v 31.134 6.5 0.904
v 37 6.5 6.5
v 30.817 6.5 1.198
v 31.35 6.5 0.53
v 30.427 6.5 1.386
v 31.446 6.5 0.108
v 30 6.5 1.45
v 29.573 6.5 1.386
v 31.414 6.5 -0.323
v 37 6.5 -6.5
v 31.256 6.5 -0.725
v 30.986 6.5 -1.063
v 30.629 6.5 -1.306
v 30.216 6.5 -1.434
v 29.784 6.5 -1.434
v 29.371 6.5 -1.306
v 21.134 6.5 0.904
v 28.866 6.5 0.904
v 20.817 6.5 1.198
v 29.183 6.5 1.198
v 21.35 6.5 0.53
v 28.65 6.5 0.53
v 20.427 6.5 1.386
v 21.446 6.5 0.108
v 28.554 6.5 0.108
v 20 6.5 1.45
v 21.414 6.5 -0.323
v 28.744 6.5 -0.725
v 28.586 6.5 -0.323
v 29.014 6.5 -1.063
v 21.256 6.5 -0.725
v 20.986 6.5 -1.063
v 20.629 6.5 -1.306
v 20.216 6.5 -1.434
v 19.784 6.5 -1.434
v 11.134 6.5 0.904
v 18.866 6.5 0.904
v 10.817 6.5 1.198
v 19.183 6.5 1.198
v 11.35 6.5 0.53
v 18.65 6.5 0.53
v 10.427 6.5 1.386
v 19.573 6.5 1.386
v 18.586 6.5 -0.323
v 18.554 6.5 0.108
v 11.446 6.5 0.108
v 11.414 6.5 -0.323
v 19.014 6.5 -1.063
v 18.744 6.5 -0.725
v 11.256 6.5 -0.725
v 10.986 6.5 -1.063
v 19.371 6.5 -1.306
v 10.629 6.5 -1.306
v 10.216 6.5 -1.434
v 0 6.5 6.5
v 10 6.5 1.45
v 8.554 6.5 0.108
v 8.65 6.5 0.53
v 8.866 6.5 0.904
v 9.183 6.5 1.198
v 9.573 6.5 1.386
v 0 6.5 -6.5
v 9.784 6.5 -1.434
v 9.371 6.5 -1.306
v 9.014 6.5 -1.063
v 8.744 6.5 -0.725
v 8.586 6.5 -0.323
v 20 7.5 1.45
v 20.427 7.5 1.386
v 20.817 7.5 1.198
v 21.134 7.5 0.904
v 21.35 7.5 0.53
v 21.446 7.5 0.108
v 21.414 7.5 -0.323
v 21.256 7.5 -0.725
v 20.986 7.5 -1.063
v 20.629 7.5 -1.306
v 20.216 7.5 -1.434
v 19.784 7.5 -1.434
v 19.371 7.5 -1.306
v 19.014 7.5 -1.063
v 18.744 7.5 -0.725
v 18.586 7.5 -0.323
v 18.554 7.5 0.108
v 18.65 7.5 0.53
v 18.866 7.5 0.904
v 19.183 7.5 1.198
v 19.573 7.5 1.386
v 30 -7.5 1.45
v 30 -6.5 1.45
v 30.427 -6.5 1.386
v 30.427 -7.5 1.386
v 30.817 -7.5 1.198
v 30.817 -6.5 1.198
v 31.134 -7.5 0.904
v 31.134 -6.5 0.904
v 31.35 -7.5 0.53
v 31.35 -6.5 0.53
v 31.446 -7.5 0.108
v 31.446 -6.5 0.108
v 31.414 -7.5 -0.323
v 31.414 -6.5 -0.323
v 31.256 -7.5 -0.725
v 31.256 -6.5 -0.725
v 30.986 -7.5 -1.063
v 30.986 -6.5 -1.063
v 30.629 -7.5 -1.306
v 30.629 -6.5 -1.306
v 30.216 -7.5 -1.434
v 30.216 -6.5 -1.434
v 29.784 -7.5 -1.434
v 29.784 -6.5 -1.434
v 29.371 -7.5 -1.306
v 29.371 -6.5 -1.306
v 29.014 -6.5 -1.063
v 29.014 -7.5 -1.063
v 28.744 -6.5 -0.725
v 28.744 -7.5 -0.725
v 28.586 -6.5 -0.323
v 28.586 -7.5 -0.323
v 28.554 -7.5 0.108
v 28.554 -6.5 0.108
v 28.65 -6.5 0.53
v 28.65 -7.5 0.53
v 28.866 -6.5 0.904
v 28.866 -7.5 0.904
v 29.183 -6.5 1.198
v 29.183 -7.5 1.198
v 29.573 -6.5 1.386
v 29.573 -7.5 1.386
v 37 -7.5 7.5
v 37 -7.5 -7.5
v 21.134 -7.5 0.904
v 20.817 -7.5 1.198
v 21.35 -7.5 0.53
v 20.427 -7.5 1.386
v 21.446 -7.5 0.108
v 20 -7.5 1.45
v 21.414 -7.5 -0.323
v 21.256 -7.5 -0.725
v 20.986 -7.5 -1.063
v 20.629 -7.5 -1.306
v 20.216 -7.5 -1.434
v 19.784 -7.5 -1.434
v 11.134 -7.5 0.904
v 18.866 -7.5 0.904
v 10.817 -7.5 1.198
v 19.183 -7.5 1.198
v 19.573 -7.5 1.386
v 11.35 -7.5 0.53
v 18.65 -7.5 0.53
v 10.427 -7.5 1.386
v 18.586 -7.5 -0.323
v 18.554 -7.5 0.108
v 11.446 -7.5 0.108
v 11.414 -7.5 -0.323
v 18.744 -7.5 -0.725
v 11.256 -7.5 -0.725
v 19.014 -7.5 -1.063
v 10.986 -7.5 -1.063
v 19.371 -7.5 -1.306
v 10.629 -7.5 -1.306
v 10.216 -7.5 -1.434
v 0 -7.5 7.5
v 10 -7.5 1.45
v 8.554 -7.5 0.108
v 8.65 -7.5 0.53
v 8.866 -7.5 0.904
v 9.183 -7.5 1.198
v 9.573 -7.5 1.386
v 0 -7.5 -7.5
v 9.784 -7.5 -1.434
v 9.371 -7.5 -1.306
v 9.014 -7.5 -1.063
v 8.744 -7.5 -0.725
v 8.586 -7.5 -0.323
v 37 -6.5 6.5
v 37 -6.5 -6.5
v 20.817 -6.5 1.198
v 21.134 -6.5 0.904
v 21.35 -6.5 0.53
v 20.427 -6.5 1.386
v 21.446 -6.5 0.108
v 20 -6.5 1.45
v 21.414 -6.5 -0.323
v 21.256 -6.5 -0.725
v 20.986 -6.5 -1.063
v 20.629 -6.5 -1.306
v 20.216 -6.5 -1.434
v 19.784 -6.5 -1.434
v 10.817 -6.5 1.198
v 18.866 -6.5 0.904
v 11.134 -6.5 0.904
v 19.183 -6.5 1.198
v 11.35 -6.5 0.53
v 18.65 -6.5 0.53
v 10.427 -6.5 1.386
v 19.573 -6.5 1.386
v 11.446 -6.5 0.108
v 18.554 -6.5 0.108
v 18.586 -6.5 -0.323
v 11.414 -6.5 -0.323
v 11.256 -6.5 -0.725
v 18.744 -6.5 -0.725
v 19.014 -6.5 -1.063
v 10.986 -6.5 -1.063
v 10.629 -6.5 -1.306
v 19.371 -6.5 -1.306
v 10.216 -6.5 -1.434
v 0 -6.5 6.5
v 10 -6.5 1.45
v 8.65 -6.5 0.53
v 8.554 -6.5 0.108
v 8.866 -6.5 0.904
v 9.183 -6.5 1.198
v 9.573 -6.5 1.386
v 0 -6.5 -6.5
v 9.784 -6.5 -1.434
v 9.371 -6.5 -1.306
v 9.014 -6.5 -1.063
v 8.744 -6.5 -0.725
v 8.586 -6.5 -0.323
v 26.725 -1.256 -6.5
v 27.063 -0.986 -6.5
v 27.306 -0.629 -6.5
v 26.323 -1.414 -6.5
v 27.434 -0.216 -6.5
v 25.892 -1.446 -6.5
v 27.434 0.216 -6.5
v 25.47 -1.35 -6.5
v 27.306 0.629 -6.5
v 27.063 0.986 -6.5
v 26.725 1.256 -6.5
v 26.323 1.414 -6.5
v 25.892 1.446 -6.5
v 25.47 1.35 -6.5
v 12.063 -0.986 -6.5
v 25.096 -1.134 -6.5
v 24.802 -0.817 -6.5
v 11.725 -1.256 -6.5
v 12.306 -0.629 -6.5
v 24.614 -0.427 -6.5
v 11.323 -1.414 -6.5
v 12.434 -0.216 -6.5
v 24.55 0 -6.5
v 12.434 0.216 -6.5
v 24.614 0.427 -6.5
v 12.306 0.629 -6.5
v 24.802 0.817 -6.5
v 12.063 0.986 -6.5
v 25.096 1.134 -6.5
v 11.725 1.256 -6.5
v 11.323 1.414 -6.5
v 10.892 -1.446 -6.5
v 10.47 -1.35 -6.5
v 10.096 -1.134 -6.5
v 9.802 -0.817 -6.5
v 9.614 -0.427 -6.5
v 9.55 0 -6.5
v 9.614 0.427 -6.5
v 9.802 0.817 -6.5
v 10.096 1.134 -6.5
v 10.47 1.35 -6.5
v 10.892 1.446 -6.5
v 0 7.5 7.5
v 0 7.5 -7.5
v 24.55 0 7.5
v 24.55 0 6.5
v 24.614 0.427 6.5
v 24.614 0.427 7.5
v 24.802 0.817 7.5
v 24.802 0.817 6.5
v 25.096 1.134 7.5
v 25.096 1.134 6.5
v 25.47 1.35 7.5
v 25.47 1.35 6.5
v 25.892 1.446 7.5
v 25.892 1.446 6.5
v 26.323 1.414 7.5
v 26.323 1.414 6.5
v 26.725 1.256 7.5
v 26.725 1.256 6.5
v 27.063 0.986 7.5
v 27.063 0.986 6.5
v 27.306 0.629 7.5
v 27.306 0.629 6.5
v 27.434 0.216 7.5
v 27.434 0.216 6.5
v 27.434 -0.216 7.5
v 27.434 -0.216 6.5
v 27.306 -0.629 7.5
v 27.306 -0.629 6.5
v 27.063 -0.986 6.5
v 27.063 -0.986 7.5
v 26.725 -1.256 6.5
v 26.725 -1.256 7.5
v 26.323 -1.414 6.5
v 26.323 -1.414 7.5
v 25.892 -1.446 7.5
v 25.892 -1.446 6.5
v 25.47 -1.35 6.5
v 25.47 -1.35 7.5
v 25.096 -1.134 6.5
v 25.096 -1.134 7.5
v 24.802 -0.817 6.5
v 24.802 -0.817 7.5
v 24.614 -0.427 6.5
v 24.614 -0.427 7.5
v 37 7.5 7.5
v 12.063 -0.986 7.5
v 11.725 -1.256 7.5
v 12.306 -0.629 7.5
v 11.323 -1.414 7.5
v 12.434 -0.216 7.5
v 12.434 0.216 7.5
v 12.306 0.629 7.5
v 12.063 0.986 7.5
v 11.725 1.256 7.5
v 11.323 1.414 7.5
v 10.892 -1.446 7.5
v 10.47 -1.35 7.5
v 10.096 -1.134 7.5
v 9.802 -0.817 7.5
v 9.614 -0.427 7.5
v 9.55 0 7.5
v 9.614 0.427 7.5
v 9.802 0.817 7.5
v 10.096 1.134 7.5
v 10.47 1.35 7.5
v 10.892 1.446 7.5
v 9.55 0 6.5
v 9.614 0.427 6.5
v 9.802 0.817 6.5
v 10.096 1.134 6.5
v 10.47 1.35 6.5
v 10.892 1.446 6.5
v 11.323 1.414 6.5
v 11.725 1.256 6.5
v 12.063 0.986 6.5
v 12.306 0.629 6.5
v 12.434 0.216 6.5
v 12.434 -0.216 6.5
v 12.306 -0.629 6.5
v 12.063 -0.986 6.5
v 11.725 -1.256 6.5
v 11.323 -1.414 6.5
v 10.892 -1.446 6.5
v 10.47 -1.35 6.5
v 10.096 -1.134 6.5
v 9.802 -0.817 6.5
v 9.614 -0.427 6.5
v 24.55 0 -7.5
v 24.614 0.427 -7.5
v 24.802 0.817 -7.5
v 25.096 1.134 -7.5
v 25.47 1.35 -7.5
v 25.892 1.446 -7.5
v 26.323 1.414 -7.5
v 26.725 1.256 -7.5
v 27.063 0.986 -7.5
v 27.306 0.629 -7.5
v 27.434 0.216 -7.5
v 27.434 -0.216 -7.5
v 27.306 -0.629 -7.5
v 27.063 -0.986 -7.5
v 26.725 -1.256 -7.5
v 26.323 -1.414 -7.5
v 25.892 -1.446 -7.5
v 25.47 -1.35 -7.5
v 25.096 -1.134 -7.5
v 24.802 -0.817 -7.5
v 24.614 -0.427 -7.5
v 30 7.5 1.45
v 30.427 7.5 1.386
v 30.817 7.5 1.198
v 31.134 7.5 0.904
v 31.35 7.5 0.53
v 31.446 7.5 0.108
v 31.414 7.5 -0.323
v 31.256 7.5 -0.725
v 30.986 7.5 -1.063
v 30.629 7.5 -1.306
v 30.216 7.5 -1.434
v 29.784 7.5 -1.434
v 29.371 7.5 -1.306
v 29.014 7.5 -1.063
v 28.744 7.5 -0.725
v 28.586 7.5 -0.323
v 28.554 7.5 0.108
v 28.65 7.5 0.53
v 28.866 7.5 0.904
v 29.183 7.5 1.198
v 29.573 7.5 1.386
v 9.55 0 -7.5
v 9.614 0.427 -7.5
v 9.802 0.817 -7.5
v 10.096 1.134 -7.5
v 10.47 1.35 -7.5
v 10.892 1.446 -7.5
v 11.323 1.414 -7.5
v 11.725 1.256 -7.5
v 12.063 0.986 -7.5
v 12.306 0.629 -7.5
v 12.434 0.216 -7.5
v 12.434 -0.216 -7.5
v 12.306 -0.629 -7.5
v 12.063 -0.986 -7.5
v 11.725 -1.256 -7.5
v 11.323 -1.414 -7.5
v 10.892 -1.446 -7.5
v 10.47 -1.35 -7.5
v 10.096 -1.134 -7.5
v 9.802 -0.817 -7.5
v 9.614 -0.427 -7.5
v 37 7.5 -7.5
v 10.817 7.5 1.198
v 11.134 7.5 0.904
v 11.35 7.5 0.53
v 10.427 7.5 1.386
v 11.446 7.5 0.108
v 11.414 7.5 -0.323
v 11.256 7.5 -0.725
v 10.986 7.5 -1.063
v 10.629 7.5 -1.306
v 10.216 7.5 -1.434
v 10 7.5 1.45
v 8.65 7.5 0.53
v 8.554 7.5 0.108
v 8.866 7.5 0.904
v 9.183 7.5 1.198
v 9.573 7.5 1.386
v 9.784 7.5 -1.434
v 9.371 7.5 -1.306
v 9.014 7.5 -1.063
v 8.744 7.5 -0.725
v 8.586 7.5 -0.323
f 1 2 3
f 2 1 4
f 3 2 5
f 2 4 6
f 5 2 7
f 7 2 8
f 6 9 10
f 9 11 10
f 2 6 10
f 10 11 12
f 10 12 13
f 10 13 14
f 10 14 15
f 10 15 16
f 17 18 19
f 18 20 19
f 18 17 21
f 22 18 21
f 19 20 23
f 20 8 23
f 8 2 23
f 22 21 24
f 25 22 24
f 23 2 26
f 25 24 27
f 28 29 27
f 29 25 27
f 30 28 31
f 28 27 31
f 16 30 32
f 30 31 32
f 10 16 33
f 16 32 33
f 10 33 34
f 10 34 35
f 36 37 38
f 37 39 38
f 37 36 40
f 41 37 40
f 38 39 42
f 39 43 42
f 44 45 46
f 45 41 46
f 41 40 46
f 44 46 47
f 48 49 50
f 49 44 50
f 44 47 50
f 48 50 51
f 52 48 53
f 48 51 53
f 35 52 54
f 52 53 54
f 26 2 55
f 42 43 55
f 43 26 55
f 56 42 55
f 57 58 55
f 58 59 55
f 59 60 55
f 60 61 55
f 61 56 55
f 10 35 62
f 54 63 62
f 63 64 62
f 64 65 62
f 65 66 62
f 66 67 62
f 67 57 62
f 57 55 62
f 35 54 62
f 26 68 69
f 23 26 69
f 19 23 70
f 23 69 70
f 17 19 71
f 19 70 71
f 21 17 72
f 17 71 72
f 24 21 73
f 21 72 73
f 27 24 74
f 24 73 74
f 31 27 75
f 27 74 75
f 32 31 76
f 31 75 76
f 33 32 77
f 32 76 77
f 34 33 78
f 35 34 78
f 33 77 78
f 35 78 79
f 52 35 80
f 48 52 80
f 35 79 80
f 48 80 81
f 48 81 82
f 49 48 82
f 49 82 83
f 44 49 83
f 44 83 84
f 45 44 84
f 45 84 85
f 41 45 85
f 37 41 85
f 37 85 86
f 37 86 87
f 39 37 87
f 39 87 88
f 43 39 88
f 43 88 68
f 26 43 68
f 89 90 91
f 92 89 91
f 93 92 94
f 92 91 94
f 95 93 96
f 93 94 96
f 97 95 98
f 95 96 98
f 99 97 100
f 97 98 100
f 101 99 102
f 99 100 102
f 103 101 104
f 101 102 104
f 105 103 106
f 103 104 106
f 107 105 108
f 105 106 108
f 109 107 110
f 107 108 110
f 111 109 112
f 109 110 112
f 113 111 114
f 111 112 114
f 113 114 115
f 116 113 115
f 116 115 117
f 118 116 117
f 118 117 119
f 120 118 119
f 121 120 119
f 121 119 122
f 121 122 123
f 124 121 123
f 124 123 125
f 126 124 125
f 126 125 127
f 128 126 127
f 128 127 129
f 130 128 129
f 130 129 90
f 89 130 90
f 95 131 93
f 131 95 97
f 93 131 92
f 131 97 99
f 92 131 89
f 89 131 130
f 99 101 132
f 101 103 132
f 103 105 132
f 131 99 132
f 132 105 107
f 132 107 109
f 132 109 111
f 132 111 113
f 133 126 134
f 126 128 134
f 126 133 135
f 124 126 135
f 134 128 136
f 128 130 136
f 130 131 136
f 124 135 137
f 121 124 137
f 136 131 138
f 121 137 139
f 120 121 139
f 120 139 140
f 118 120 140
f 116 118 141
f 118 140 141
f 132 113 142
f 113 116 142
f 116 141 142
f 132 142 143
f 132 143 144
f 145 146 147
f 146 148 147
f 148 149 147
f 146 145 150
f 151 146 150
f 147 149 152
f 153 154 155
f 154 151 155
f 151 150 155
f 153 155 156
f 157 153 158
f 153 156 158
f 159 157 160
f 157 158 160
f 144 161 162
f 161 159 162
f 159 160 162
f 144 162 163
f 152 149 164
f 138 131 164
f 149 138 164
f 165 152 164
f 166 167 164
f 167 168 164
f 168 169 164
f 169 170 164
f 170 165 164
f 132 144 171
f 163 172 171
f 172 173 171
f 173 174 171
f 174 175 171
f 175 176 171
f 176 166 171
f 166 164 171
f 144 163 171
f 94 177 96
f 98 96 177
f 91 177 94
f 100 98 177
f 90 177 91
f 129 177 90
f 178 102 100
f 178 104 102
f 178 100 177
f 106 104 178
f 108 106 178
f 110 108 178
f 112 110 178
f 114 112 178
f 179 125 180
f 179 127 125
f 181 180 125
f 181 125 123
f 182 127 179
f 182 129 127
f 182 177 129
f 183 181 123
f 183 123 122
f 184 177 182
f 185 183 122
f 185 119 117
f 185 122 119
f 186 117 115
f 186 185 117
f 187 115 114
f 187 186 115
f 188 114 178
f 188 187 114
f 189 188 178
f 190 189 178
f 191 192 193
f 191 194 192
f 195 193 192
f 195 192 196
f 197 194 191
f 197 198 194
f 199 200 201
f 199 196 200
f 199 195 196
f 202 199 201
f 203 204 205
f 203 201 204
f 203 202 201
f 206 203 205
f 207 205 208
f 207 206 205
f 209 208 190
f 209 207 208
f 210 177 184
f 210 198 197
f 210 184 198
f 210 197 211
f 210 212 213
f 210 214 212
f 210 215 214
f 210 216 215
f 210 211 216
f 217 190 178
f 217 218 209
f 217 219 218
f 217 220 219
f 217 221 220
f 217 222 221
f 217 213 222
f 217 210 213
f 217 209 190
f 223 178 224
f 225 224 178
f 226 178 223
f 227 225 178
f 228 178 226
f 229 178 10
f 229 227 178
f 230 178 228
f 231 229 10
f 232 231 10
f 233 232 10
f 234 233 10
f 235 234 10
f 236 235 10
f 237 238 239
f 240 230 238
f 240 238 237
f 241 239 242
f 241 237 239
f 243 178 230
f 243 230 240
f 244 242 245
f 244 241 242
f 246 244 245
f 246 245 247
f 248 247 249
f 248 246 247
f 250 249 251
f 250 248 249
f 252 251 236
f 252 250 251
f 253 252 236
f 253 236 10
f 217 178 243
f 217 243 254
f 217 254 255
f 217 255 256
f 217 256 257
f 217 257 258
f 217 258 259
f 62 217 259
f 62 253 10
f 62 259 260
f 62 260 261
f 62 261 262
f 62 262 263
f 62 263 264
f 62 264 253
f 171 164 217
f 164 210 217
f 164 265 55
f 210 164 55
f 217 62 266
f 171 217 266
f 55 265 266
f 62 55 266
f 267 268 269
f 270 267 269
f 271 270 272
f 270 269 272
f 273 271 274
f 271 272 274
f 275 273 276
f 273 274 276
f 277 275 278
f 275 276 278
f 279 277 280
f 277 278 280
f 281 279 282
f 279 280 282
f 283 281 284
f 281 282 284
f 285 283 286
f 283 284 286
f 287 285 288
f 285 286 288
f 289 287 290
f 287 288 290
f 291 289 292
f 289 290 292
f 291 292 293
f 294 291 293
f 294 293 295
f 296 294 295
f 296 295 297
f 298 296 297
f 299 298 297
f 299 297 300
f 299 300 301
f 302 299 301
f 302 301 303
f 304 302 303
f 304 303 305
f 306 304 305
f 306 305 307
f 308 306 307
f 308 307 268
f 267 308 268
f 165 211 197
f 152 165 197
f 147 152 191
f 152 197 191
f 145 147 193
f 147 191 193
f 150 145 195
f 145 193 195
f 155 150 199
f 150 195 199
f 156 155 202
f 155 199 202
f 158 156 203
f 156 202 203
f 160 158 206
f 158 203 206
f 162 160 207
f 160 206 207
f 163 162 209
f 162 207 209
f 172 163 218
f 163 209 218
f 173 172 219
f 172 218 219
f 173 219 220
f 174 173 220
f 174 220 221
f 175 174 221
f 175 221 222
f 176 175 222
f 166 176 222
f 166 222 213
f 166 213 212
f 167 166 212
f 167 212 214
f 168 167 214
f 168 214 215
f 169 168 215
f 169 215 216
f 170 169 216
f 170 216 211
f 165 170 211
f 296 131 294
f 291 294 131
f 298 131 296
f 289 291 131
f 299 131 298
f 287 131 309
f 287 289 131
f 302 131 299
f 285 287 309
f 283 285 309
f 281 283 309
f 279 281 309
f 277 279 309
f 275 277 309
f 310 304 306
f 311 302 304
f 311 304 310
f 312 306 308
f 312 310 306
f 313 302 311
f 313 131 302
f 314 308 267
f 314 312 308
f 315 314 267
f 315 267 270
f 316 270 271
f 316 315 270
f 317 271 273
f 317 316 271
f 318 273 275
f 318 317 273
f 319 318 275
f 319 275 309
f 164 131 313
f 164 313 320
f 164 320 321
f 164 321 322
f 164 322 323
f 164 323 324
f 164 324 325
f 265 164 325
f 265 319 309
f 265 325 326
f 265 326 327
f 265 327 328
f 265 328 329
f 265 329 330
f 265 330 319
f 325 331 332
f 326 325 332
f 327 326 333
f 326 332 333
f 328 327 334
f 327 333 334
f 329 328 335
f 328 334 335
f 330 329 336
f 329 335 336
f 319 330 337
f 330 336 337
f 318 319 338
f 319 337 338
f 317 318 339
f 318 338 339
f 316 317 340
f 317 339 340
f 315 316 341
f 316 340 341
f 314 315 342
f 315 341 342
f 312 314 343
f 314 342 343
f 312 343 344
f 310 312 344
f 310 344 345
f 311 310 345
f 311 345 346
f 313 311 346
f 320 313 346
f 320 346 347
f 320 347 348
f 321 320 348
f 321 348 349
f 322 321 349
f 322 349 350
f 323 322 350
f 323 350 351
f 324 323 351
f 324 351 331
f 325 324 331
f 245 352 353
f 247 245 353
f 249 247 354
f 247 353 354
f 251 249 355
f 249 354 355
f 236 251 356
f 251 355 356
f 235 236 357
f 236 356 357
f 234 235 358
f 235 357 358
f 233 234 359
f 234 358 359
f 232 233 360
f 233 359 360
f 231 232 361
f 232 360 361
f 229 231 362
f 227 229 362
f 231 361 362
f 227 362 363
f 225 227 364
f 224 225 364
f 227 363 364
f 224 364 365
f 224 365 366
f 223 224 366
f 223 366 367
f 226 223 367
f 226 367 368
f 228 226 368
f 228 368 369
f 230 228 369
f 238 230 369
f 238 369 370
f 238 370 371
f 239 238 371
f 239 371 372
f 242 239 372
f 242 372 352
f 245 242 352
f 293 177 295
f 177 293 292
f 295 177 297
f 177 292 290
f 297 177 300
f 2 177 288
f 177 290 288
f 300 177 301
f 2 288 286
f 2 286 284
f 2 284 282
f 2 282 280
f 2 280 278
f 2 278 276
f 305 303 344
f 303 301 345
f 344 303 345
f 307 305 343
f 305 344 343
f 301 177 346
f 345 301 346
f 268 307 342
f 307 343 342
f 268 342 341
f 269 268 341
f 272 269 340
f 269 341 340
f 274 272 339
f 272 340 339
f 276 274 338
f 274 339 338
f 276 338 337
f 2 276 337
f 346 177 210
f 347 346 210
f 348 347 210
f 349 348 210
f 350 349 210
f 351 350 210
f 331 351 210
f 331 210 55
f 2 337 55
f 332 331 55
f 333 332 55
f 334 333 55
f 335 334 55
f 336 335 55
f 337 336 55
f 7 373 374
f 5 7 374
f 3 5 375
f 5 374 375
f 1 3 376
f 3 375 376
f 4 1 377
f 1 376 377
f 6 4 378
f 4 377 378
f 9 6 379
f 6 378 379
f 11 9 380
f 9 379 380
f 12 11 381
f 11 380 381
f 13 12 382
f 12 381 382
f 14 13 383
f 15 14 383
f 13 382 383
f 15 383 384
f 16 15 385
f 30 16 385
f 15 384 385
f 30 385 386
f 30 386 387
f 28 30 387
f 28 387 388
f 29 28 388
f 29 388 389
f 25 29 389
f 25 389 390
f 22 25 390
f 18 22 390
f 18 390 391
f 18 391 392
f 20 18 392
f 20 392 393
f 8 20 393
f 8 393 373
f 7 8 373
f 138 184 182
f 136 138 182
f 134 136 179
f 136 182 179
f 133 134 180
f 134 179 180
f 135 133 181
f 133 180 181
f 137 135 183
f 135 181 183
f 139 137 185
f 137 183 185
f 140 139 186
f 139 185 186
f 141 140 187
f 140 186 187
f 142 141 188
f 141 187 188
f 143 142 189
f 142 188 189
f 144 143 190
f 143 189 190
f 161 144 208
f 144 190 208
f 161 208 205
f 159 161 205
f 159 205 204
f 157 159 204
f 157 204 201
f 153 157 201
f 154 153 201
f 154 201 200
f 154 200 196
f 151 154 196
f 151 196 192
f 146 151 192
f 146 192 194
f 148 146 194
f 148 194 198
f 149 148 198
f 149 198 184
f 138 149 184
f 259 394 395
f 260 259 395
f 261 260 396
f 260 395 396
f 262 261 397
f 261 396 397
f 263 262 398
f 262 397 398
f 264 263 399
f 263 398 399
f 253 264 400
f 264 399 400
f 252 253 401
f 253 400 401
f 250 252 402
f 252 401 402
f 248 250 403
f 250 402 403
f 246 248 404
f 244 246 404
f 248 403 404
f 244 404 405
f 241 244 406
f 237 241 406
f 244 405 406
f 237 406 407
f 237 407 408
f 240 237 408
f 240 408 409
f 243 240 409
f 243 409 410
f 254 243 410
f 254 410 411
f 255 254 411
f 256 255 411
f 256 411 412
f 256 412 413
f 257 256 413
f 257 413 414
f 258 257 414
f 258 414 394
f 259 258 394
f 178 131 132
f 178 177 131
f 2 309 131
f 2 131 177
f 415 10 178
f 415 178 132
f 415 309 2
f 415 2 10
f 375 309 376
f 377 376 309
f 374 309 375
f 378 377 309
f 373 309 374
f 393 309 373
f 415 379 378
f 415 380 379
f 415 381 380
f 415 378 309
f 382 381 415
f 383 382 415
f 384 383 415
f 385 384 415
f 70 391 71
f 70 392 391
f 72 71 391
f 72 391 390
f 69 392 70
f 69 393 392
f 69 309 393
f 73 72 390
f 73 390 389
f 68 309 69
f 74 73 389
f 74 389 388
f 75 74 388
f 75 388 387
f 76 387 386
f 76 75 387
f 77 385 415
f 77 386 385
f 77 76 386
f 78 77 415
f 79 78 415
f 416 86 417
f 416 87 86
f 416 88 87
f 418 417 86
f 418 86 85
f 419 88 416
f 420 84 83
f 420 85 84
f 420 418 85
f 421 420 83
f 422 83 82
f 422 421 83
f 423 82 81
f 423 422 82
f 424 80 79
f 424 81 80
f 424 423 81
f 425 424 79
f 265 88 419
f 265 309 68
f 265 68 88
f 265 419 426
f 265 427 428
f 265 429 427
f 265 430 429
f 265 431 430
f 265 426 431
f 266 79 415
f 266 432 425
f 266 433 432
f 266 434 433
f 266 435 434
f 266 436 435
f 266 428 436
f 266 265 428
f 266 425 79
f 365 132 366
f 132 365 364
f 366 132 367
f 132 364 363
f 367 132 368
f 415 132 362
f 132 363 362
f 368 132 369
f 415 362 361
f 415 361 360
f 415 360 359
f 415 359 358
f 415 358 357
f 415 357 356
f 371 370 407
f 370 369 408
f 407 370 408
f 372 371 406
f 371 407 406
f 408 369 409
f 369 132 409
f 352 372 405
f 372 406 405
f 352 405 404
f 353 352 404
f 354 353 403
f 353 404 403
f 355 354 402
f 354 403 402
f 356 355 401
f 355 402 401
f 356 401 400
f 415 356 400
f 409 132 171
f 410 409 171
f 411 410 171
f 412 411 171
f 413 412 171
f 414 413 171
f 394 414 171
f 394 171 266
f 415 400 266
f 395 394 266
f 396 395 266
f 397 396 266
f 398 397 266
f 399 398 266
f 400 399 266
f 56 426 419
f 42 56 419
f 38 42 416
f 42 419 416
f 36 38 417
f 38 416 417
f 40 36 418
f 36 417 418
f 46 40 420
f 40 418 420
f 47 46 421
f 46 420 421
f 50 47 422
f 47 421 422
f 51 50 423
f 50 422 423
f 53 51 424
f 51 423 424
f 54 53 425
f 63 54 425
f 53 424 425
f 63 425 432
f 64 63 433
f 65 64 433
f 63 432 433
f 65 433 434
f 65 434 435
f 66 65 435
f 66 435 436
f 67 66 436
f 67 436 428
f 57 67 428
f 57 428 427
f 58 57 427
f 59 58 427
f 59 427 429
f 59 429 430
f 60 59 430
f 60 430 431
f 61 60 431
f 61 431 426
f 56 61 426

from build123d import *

# Parameters (mm, degrees)
SKETCH_1_W          = 15
SKETCH_1_H          = 15
SKETCH_1_W_2        = 13
SKETCH_1_H_2        = 13
EXTRUDE_1_DEPTH     = 37
SKETCH_2_R          = 1.45
CUT_EXTRUDE_1_DEPTH = 41.623269194
SKETCH_3_R          = 1.45
CUT_EXTRUDE_2_DEPTH = 41.623269194


with BuildPart() as part:
    # 草图1 → 凸台-拉伸1 (new body)
    with BuildSketch(Plane(origin=(0, 0, 0), x_dir=(0, 0, -1), z_dir=(1, 0, 0))):
        Rectangle(SKETCH_1_W, SKETCH_1_H)
        Rectangle(SKETCH_1_W_2, SKETCH_1_H_2, mode=Mode.SUBTRACT)
    extrude(amount=EXTRUDE_1_DEPTH)

    # 草图2 → 切除-拉伸1 (cut, through all)
    with BuildSketch(Plane(origin=(0, 0, -7.5), x_dir=(-1, 0, 0), z_dir=(0, 0, -1))):
        with Locations((-11, 0)):
            Circle(SKETCH_2_R)
        with Locations((-26, 0)):
            Circle(SKETCH_2_R)
    extrude(amount=-CUT_EXTRUDE_1_DEPTH, mode=Mode.SUBTRACT)

    # 草图3 → 切除-拉伸2 (cut, through all)
    with BuildSketch(Plane(origin=(0, 7.5, 0), x_dir=(1, 0, 0), z_dir=(0, 1, 0))):
        with Locations(Location((10, 0, 0), (0, 0, 270))):
            Circle(SKETCH_3_R)
        with Locations(Location((30, 0, 0), (0, 0, 270))):
            Circle(SKETCH_3_R)
        with Locations(Location((20, 0, 0), (0, 0, 270))):
            Circle(SKETCH_3_R)
    extrude(amount=-CUT_EXTRUDE_2_DEPTH, mode=Mode.SUBTRACT)


solid = part.part
